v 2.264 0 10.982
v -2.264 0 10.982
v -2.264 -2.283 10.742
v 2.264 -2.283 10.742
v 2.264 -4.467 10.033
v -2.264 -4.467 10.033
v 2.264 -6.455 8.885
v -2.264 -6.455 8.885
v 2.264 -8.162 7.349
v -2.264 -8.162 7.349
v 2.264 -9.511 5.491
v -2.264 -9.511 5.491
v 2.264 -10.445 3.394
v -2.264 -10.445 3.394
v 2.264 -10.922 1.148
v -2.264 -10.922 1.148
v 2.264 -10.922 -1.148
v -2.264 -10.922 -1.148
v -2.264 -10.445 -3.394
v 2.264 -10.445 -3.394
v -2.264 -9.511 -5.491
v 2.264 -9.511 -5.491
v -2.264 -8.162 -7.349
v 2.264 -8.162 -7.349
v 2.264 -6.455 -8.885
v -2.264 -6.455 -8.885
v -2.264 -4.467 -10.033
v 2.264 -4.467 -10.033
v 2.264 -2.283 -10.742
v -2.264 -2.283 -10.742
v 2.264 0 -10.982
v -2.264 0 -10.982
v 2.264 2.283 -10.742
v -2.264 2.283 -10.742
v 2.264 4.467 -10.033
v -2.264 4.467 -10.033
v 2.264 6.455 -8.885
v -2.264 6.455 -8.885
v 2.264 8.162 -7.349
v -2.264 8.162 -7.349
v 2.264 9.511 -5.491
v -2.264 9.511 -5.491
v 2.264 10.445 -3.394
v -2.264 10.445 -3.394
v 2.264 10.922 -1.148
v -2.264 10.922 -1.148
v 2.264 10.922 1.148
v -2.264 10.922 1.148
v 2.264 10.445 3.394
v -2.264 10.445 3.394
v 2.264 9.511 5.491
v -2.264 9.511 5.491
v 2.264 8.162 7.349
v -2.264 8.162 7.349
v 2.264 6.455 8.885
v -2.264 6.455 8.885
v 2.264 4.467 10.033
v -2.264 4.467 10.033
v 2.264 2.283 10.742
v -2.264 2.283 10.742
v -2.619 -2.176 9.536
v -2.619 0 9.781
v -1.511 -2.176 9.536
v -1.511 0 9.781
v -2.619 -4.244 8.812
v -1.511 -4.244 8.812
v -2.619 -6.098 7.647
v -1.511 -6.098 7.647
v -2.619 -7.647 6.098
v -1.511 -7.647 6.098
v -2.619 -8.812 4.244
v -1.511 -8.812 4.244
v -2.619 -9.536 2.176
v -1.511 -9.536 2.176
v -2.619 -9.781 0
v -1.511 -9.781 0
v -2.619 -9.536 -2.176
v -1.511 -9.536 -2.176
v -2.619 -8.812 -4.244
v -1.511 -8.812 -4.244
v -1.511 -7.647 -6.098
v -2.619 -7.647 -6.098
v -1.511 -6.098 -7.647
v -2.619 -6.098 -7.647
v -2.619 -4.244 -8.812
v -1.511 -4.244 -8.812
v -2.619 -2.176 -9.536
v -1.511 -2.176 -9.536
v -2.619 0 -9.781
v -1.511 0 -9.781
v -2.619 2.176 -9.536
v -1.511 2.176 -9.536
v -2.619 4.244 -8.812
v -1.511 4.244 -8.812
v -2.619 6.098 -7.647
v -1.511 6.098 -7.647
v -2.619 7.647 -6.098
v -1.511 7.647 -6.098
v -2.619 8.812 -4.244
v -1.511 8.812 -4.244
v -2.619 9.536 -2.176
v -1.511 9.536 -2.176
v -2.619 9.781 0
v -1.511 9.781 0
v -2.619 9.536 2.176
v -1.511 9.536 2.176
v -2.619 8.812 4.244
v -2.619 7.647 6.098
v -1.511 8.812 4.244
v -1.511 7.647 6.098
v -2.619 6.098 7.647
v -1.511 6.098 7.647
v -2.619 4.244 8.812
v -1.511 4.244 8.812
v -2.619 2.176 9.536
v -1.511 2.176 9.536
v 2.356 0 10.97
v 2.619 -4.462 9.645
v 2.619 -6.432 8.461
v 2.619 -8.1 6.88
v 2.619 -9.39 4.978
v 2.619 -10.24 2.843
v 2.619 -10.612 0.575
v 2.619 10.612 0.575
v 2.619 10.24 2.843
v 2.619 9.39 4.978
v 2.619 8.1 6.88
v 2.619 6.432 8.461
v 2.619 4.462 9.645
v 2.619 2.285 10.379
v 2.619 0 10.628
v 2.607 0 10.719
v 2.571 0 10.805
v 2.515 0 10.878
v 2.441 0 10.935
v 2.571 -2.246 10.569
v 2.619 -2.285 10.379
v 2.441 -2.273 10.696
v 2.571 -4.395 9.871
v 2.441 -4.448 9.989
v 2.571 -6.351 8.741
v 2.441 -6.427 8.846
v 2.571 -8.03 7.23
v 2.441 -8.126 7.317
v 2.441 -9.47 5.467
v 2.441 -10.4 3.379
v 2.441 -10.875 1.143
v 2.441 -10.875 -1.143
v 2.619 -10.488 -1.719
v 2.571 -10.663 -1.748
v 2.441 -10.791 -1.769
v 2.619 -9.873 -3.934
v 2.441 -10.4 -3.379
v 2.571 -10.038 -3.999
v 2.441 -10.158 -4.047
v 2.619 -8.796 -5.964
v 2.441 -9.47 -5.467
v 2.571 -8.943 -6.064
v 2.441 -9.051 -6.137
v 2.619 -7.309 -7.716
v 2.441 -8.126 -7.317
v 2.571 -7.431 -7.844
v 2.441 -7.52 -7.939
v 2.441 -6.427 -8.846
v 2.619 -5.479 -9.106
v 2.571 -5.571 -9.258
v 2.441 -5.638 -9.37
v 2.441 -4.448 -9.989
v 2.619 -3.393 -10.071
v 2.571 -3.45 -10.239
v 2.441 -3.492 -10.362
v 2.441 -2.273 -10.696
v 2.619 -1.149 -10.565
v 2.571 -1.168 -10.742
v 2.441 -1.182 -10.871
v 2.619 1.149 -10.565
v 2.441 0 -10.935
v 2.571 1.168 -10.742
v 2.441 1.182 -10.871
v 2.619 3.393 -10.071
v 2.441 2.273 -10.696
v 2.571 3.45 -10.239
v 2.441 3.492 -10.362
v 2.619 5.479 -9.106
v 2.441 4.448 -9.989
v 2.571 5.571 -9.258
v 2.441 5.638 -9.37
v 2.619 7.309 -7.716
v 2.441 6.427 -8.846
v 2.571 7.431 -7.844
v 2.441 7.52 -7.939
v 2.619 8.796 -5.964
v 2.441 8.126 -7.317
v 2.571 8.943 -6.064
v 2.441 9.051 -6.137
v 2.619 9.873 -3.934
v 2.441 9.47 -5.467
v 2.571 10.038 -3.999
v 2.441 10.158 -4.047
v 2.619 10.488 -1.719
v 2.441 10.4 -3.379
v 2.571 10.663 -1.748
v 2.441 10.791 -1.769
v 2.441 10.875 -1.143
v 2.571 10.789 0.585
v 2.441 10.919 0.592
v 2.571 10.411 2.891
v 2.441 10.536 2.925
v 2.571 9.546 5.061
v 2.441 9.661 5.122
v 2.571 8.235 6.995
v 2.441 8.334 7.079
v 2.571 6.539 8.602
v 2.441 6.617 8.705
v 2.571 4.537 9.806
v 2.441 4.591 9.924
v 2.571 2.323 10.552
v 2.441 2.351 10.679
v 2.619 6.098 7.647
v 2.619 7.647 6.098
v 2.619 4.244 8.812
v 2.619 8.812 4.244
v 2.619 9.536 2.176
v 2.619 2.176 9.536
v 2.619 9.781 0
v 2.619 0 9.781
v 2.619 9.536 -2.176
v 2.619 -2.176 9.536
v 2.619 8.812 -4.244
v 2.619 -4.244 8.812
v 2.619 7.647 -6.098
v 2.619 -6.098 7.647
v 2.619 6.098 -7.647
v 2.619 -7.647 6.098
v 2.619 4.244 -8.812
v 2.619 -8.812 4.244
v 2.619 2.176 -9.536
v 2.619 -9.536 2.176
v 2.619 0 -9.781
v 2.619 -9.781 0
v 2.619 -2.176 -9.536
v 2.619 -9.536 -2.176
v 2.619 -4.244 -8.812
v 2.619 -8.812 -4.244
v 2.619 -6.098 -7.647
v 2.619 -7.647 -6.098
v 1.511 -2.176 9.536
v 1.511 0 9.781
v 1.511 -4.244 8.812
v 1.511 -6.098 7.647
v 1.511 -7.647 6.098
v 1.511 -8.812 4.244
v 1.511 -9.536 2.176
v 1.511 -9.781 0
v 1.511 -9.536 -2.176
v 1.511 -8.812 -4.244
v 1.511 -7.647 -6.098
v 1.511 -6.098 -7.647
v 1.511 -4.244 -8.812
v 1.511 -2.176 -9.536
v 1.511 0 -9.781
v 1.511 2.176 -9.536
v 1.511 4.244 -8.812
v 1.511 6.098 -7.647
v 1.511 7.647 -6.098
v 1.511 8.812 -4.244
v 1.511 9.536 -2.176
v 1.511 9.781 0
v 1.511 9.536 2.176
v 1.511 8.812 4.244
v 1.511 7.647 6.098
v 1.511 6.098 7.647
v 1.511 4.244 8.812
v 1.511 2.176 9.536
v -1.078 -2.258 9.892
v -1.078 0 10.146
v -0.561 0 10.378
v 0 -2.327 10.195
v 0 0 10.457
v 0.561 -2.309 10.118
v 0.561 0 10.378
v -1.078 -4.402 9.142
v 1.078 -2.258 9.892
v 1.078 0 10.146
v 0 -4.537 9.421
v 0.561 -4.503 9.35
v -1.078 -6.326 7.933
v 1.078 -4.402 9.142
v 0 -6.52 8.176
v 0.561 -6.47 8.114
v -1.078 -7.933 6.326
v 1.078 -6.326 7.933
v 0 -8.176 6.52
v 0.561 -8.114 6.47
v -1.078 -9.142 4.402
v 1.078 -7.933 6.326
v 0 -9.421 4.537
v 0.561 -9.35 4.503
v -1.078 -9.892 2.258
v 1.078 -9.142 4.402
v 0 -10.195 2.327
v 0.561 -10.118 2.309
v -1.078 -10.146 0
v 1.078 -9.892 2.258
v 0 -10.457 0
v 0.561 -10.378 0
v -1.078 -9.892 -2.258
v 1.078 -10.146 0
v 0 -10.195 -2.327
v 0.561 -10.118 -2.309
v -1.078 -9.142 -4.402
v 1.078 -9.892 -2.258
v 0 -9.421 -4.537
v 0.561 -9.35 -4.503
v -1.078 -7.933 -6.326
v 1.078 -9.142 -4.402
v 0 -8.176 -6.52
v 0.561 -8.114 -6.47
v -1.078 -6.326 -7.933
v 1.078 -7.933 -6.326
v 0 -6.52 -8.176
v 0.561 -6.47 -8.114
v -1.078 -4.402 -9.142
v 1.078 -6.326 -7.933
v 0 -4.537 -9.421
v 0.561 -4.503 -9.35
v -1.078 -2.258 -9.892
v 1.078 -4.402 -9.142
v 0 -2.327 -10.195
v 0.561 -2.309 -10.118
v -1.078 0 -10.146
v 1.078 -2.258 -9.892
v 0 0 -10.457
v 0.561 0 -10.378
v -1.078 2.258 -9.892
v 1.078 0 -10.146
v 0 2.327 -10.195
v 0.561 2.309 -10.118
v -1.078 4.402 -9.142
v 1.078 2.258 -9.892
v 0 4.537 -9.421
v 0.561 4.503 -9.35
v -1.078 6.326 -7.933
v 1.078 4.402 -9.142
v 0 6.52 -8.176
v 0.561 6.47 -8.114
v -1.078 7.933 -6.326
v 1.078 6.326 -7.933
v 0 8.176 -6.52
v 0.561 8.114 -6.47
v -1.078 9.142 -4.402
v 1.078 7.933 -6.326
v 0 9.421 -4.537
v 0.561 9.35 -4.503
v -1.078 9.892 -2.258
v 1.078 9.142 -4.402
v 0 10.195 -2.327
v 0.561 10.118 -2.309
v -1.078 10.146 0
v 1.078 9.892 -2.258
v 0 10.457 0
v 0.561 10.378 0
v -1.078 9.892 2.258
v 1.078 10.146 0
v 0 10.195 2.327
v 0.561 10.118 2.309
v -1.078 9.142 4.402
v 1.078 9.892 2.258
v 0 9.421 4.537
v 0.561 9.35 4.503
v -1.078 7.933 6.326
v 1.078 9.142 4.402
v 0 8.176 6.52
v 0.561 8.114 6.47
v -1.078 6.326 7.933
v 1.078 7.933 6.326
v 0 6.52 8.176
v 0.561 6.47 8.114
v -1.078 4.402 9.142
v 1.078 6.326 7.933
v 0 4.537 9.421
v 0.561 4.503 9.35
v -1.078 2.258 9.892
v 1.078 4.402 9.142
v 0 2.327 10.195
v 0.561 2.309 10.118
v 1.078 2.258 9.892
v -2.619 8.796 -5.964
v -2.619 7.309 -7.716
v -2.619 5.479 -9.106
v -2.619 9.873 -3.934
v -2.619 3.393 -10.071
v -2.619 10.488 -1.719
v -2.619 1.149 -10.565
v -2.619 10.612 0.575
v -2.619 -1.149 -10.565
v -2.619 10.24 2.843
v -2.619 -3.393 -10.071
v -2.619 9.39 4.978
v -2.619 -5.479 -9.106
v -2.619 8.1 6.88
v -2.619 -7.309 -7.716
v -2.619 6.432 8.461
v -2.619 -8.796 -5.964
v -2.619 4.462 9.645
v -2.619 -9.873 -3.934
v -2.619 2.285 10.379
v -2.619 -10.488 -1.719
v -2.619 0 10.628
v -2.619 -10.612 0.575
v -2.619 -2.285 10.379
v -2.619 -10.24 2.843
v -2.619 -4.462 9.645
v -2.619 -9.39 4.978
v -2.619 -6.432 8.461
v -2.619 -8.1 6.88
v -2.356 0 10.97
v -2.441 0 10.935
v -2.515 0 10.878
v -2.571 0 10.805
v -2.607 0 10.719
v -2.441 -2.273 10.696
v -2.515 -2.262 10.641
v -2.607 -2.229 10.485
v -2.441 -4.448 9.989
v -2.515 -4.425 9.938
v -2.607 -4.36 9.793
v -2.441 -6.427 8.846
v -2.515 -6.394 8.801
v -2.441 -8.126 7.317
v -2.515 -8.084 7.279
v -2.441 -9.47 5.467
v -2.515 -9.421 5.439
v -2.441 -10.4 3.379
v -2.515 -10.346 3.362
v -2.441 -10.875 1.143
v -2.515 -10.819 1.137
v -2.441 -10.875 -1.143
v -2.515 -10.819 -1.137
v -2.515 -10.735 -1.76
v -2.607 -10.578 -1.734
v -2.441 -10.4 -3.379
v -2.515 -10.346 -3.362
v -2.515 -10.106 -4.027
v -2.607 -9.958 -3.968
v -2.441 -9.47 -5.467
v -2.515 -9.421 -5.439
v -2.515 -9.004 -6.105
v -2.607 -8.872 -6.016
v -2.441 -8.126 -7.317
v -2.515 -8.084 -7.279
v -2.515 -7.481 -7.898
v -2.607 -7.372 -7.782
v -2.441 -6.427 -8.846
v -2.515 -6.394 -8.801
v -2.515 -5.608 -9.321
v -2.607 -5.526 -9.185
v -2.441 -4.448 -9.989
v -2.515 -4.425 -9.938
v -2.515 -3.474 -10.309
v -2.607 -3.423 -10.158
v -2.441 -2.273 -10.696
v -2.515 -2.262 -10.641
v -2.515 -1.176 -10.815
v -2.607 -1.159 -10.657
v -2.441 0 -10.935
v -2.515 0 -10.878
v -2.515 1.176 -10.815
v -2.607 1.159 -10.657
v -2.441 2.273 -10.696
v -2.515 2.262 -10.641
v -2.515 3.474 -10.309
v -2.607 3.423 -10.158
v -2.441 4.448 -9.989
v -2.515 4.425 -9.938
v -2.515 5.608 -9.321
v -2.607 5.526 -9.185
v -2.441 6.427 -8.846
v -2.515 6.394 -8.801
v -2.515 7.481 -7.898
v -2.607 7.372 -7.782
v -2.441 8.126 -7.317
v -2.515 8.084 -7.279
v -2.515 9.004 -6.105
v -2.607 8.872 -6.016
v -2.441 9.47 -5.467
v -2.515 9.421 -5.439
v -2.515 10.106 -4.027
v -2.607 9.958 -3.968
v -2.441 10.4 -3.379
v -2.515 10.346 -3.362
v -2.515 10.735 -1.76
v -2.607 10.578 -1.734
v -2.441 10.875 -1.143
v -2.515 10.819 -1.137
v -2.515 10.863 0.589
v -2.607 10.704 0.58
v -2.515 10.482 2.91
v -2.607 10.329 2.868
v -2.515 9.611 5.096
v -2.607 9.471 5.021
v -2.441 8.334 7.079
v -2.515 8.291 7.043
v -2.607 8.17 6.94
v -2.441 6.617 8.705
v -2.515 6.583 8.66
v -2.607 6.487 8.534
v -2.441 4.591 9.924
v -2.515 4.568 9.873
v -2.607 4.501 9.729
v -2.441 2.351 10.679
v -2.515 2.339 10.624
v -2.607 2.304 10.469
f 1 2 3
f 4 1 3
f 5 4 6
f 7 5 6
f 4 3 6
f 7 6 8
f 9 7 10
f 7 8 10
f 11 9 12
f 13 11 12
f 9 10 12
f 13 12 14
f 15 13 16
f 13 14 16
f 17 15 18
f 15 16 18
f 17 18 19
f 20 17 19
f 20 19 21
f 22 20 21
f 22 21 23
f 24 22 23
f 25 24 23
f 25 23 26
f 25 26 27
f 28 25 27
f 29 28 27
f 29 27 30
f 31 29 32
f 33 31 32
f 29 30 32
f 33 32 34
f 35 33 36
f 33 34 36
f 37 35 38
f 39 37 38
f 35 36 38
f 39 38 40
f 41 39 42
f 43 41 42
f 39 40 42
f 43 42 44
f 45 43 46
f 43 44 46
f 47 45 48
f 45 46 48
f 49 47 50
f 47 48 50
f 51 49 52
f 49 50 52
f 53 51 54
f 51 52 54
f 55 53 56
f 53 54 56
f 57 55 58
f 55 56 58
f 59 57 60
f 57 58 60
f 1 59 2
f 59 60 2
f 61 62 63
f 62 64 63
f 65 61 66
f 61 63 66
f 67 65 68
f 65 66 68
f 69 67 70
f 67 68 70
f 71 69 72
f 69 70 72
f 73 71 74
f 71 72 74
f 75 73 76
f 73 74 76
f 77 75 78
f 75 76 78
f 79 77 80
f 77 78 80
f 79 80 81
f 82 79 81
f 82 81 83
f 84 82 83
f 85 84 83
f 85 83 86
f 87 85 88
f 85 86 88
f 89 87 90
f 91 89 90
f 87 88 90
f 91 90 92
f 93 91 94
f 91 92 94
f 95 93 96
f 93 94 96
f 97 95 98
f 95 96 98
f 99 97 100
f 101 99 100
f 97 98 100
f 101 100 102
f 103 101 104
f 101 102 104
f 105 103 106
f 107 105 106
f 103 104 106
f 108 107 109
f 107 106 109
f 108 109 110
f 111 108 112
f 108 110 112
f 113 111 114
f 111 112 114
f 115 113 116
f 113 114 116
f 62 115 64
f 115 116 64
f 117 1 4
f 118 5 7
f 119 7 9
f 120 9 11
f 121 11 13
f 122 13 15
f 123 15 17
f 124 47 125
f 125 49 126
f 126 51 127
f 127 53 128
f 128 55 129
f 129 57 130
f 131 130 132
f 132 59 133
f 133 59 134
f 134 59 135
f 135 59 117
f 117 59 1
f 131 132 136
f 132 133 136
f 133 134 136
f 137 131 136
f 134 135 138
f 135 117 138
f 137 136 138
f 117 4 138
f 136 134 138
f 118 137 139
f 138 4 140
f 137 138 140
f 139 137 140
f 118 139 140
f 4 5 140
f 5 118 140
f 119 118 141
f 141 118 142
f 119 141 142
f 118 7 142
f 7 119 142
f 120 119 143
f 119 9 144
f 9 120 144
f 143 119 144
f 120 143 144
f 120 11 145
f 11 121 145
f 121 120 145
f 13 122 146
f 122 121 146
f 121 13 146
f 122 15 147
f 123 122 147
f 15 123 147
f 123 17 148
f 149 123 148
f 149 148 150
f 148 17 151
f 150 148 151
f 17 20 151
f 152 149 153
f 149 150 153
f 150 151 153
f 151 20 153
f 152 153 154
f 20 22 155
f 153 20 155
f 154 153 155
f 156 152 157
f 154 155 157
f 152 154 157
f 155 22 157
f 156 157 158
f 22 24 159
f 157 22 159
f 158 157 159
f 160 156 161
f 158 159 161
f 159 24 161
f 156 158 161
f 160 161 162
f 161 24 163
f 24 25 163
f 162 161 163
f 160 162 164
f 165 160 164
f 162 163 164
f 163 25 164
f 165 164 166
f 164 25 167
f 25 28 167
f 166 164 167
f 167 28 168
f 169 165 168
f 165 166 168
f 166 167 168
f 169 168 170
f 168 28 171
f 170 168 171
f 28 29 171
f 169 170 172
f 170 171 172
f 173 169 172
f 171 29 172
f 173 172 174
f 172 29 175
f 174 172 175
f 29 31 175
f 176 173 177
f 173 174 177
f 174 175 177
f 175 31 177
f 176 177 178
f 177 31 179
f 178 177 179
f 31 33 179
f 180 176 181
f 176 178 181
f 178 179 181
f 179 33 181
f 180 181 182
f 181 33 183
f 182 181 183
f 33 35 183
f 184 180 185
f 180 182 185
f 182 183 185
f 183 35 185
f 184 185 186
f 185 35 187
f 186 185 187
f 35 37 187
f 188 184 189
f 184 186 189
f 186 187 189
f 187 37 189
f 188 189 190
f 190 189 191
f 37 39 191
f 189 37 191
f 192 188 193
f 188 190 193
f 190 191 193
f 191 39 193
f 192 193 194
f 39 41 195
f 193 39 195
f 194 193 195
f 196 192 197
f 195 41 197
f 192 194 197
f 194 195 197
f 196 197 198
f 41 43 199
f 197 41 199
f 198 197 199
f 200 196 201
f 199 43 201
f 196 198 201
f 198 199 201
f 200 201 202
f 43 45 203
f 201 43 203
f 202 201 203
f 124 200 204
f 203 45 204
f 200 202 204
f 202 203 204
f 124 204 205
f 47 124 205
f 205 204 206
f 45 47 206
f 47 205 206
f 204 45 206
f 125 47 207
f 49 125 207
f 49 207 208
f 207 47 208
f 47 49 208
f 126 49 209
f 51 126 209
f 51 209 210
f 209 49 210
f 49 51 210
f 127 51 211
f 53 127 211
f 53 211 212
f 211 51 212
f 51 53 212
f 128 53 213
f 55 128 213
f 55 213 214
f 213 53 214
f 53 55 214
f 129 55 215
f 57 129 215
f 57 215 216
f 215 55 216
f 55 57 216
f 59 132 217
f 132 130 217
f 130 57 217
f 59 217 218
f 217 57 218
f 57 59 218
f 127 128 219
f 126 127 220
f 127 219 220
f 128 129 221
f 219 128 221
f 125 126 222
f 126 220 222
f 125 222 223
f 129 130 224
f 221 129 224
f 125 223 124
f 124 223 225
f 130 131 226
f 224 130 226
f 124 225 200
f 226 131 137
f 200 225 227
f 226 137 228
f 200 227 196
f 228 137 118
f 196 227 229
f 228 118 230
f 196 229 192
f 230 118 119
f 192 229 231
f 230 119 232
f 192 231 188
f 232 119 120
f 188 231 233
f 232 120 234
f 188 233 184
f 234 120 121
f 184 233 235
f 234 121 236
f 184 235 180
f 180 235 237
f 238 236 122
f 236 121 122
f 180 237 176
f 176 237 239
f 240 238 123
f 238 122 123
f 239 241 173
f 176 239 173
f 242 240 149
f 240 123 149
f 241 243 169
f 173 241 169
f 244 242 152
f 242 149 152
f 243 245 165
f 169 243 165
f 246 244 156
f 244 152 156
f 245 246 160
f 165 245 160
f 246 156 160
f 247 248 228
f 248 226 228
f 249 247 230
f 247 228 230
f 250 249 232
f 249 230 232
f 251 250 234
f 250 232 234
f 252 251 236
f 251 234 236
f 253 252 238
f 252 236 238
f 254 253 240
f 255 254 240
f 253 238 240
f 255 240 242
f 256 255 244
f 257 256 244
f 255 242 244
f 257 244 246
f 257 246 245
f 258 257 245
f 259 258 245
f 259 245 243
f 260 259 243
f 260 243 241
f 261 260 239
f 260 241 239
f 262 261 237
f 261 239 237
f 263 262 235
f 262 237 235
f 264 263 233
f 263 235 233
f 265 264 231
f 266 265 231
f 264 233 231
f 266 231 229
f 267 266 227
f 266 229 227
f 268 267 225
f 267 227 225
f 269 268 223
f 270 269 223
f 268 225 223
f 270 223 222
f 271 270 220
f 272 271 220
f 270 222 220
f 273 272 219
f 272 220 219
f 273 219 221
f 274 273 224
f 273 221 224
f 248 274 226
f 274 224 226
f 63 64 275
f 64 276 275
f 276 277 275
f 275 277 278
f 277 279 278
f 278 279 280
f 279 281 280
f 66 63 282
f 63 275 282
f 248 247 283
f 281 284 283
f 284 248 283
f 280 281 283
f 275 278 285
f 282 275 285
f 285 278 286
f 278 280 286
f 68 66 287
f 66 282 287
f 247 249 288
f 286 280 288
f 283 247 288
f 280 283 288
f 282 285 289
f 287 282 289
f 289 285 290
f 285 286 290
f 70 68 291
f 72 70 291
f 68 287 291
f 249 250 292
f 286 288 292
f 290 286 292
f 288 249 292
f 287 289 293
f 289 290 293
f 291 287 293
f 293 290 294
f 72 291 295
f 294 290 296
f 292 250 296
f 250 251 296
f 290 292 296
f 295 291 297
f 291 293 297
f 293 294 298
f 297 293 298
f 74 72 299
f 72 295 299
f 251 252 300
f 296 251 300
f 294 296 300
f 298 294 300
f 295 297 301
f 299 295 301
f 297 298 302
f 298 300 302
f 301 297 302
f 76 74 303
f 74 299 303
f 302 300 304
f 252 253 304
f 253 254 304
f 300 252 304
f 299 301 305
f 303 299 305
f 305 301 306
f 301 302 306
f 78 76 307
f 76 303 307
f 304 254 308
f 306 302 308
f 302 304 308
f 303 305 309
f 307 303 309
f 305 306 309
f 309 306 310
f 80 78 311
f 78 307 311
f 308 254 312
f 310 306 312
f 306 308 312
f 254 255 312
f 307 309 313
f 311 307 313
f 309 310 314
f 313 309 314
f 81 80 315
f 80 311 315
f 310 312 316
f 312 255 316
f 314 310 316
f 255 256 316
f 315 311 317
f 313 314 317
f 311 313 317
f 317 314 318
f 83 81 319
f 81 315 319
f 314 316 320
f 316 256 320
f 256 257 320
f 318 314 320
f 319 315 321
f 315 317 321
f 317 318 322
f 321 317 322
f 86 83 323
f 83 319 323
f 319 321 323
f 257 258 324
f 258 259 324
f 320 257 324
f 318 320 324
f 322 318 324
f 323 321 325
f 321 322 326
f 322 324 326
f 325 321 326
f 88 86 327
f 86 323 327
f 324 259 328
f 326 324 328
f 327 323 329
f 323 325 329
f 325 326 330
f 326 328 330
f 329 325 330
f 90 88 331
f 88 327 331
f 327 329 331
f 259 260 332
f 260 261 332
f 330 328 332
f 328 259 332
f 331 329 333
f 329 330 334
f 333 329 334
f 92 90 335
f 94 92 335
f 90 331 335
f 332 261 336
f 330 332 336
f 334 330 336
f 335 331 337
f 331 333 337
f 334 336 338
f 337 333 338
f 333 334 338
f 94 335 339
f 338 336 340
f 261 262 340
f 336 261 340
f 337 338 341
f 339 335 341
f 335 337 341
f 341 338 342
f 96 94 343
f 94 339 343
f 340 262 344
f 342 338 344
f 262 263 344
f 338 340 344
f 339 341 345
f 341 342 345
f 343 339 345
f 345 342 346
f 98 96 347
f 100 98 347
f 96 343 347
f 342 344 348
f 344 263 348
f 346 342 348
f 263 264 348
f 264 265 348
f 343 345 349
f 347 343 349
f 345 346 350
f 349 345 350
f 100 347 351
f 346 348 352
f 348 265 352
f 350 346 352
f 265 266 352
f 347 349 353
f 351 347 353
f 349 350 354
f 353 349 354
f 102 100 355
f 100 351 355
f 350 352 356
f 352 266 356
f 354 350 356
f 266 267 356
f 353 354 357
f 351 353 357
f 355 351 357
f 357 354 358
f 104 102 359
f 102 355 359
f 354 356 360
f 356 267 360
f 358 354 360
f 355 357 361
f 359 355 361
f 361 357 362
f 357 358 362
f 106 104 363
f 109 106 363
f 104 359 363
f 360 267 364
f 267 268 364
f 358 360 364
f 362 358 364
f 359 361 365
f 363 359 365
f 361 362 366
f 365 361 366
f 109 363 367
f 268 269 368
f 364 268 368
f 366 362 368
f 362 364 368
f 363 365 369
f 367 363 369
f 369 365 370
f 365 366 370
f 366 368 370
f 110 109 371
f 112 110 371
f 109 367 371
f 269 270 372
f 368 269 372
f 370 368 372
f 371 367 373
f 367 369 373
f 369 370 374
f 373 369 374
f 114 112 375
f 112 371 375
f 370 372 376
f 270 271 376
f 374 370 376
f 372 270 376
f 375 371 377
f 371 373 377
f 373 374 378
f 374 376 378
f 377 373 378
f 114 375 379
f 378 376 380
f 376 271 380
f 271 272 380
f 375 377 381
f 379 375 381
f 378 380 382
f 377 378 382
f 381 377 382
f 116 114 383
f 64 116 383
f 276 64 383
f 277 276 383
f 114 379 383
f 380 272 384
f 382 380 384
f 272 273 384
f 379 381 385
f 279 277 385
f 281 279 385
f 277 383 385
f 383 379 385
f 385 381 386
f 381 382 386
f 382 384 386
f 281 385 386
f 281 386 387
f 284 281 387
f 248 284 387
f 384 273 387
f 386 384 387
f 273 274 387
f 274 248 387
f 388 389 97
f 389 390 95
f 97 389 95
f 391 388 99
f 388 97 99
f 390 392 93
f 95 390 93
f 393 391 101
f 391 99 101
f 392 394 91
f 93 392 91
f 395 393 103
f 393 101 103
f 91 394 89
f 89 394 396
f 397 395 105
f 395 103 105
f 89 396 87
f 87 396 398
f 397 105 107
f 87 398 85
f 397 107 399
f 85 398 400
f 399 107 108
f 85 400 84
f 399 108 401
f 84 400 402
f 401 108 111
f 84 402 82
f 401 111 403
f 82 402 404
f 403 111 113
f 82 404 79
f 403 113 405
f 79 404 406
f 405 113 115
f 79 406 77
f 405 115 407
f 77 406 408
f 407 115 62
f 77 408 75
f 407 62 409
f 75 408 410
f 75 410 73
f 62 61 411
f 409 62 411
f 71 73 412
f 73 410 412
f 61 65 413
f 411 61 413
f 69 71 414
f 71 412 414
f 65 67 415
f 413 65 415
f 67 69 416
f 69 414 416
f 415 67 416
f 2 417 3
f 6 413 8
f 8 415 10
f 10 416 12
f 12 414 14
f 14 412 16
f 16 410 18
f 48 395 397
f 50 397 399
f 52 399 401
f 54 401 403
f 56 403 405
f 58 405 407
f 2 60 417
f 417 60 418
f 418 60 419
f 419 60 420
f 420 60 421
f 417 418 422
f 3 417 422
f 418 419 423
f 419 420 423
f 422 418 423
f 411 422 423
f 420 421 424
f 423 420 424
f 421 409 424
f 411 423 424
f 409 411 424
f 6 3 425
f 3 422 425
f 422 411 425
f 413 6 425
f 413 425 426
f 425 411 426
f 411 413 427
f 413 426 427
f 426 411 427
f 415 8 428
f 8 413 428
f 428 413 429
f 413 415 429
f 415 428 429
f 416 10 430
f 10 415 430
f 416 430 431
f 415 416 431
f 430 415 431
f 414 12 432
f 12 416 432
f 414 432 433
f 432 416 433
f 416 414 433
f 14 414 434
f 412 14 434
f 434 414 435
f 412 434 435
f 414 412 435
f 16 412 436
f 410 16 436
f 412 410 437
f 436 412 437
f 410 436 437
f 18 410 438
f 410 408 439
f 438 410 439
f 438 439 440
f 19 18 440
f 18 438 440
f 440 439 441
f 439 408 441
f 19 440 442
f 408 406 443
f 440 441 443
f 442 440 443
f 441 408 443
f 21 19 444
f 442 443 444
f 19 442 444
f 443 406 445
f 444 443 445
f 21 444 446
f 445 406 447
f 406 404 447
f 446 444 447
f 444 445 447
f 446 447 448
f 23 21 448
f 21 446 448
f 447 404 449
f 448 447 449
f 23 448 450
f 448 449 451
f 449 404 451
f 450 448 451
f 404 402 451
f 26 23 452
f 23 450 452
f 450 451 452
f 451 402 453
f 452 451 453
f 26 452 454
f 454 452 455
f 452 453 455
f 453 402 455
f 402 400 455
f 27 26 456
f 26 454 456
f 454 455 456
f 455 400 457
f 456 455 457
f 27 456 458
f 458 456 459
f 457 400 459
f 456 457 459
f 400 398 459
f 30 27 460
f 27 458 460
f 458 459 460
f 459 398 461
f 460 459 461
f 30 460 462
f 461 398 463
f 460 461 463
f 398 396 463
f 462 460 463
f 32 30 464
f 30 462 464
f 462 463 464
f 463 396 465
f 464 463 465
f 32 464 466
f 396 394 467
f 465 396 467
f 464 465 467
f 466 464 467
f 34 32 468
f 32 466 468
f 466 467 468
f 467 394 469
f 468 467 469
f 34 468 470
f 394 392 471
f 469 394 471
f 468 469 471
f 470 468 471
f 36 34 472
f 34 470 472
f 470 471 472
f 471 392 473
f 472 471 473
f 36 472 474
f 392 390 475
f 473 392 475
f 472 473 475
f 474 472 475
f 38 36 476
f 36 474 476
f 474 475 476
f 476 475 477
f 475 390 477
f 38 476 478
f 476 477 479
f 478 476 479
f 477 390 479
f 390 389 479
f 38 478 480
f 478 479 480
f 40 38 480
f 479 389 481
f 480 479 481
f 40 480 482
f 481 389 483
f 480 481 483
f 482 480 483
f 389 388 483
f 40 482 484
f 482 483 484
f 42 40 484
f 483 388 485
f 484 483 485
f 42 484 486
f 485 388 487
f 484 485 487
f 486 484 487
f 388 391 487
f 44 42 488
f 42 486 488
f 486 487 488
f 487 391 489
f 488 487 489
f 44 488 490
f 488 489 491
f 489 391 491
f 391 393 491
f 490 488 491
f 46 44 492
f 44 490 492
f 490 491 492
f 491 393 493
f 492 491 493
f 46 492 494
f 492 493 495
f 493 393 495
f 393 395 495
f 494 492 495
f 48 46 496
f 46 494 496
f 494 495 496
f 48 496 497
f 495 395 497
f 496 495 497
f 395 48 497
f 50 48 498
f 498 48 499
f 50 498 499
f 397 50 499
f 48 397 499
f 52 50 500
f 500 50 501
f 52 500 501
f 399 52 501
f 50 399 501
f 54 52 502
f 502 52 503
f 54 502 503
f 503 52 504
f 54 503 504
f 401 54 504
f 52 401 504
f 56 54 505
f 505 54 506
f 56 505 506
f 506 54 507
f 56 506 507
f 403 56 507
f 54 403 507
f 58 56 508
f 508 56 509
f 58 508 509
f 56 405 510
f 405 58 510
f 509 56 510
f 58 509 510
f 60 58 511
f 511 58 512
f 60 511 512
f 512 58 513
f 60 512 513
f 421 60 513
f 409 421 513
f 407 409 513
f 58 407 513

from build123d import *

# Parameters (mm, degrees)
FILLET1_R    = 2.1
SCALE1_SCALE = 0.22
SCALE2_SCALE = 0.2
SCALE3_SCALE = 3.84


with BuildPart() as part:
    # Sketch1 → Revolve1 (revolve)
    with BuildSketch(Plane.XY, mode=Mode.PRIVATE) as revolve1_sk:
        with BuildLine():
            Line((-15.5, 57.89), (-8.94427191, 57.89))
            ThreePointArc((-8.94427191, 57.89), (0, 61.89), (8.94427191, 57.89))
            Line((8.94427191, 57.89), (15.5, 57.89))
            Line((15.5, 57.89), (15.5, 65))
            Line((15.5, 65), (-15.5, 65))
            Line((-15.5, 65), (-15.5, 57.89))
        make_face()
    revolve(revolve1_sk.sketch.rotate(Axis((-92.395721925, 0, 0), (1, 0, 0)), 90), axis=Axis((-92.395721925, 0, 0), (1, 0, 0)))

    # Fillet1
    fillet1_edges = [part.edges().sort_by_distance(p)[0] for p in [
        (15.5, 0, -65),
        (-15.5, 0, -65),
    ]]
    fillet(fillet1_edges, radius=FILLET1_R)


with BuildPart() as part_1:
    # Scale1: scaled about (0, 0, 0)
    add(part.part.scale(SCALE1_SCALE))


with BuildPart() as part_2:
    # Scale2: scaled about (0, 0, 0)
    add(part_1.part.scale(SCALE2_SCALE))


with BuildPart() as part_3:
    # Scale3: scaled about (0, 0, 0)
    add(part_2.part.scale(SCALE3_SCALE))


solid = part_3.part
